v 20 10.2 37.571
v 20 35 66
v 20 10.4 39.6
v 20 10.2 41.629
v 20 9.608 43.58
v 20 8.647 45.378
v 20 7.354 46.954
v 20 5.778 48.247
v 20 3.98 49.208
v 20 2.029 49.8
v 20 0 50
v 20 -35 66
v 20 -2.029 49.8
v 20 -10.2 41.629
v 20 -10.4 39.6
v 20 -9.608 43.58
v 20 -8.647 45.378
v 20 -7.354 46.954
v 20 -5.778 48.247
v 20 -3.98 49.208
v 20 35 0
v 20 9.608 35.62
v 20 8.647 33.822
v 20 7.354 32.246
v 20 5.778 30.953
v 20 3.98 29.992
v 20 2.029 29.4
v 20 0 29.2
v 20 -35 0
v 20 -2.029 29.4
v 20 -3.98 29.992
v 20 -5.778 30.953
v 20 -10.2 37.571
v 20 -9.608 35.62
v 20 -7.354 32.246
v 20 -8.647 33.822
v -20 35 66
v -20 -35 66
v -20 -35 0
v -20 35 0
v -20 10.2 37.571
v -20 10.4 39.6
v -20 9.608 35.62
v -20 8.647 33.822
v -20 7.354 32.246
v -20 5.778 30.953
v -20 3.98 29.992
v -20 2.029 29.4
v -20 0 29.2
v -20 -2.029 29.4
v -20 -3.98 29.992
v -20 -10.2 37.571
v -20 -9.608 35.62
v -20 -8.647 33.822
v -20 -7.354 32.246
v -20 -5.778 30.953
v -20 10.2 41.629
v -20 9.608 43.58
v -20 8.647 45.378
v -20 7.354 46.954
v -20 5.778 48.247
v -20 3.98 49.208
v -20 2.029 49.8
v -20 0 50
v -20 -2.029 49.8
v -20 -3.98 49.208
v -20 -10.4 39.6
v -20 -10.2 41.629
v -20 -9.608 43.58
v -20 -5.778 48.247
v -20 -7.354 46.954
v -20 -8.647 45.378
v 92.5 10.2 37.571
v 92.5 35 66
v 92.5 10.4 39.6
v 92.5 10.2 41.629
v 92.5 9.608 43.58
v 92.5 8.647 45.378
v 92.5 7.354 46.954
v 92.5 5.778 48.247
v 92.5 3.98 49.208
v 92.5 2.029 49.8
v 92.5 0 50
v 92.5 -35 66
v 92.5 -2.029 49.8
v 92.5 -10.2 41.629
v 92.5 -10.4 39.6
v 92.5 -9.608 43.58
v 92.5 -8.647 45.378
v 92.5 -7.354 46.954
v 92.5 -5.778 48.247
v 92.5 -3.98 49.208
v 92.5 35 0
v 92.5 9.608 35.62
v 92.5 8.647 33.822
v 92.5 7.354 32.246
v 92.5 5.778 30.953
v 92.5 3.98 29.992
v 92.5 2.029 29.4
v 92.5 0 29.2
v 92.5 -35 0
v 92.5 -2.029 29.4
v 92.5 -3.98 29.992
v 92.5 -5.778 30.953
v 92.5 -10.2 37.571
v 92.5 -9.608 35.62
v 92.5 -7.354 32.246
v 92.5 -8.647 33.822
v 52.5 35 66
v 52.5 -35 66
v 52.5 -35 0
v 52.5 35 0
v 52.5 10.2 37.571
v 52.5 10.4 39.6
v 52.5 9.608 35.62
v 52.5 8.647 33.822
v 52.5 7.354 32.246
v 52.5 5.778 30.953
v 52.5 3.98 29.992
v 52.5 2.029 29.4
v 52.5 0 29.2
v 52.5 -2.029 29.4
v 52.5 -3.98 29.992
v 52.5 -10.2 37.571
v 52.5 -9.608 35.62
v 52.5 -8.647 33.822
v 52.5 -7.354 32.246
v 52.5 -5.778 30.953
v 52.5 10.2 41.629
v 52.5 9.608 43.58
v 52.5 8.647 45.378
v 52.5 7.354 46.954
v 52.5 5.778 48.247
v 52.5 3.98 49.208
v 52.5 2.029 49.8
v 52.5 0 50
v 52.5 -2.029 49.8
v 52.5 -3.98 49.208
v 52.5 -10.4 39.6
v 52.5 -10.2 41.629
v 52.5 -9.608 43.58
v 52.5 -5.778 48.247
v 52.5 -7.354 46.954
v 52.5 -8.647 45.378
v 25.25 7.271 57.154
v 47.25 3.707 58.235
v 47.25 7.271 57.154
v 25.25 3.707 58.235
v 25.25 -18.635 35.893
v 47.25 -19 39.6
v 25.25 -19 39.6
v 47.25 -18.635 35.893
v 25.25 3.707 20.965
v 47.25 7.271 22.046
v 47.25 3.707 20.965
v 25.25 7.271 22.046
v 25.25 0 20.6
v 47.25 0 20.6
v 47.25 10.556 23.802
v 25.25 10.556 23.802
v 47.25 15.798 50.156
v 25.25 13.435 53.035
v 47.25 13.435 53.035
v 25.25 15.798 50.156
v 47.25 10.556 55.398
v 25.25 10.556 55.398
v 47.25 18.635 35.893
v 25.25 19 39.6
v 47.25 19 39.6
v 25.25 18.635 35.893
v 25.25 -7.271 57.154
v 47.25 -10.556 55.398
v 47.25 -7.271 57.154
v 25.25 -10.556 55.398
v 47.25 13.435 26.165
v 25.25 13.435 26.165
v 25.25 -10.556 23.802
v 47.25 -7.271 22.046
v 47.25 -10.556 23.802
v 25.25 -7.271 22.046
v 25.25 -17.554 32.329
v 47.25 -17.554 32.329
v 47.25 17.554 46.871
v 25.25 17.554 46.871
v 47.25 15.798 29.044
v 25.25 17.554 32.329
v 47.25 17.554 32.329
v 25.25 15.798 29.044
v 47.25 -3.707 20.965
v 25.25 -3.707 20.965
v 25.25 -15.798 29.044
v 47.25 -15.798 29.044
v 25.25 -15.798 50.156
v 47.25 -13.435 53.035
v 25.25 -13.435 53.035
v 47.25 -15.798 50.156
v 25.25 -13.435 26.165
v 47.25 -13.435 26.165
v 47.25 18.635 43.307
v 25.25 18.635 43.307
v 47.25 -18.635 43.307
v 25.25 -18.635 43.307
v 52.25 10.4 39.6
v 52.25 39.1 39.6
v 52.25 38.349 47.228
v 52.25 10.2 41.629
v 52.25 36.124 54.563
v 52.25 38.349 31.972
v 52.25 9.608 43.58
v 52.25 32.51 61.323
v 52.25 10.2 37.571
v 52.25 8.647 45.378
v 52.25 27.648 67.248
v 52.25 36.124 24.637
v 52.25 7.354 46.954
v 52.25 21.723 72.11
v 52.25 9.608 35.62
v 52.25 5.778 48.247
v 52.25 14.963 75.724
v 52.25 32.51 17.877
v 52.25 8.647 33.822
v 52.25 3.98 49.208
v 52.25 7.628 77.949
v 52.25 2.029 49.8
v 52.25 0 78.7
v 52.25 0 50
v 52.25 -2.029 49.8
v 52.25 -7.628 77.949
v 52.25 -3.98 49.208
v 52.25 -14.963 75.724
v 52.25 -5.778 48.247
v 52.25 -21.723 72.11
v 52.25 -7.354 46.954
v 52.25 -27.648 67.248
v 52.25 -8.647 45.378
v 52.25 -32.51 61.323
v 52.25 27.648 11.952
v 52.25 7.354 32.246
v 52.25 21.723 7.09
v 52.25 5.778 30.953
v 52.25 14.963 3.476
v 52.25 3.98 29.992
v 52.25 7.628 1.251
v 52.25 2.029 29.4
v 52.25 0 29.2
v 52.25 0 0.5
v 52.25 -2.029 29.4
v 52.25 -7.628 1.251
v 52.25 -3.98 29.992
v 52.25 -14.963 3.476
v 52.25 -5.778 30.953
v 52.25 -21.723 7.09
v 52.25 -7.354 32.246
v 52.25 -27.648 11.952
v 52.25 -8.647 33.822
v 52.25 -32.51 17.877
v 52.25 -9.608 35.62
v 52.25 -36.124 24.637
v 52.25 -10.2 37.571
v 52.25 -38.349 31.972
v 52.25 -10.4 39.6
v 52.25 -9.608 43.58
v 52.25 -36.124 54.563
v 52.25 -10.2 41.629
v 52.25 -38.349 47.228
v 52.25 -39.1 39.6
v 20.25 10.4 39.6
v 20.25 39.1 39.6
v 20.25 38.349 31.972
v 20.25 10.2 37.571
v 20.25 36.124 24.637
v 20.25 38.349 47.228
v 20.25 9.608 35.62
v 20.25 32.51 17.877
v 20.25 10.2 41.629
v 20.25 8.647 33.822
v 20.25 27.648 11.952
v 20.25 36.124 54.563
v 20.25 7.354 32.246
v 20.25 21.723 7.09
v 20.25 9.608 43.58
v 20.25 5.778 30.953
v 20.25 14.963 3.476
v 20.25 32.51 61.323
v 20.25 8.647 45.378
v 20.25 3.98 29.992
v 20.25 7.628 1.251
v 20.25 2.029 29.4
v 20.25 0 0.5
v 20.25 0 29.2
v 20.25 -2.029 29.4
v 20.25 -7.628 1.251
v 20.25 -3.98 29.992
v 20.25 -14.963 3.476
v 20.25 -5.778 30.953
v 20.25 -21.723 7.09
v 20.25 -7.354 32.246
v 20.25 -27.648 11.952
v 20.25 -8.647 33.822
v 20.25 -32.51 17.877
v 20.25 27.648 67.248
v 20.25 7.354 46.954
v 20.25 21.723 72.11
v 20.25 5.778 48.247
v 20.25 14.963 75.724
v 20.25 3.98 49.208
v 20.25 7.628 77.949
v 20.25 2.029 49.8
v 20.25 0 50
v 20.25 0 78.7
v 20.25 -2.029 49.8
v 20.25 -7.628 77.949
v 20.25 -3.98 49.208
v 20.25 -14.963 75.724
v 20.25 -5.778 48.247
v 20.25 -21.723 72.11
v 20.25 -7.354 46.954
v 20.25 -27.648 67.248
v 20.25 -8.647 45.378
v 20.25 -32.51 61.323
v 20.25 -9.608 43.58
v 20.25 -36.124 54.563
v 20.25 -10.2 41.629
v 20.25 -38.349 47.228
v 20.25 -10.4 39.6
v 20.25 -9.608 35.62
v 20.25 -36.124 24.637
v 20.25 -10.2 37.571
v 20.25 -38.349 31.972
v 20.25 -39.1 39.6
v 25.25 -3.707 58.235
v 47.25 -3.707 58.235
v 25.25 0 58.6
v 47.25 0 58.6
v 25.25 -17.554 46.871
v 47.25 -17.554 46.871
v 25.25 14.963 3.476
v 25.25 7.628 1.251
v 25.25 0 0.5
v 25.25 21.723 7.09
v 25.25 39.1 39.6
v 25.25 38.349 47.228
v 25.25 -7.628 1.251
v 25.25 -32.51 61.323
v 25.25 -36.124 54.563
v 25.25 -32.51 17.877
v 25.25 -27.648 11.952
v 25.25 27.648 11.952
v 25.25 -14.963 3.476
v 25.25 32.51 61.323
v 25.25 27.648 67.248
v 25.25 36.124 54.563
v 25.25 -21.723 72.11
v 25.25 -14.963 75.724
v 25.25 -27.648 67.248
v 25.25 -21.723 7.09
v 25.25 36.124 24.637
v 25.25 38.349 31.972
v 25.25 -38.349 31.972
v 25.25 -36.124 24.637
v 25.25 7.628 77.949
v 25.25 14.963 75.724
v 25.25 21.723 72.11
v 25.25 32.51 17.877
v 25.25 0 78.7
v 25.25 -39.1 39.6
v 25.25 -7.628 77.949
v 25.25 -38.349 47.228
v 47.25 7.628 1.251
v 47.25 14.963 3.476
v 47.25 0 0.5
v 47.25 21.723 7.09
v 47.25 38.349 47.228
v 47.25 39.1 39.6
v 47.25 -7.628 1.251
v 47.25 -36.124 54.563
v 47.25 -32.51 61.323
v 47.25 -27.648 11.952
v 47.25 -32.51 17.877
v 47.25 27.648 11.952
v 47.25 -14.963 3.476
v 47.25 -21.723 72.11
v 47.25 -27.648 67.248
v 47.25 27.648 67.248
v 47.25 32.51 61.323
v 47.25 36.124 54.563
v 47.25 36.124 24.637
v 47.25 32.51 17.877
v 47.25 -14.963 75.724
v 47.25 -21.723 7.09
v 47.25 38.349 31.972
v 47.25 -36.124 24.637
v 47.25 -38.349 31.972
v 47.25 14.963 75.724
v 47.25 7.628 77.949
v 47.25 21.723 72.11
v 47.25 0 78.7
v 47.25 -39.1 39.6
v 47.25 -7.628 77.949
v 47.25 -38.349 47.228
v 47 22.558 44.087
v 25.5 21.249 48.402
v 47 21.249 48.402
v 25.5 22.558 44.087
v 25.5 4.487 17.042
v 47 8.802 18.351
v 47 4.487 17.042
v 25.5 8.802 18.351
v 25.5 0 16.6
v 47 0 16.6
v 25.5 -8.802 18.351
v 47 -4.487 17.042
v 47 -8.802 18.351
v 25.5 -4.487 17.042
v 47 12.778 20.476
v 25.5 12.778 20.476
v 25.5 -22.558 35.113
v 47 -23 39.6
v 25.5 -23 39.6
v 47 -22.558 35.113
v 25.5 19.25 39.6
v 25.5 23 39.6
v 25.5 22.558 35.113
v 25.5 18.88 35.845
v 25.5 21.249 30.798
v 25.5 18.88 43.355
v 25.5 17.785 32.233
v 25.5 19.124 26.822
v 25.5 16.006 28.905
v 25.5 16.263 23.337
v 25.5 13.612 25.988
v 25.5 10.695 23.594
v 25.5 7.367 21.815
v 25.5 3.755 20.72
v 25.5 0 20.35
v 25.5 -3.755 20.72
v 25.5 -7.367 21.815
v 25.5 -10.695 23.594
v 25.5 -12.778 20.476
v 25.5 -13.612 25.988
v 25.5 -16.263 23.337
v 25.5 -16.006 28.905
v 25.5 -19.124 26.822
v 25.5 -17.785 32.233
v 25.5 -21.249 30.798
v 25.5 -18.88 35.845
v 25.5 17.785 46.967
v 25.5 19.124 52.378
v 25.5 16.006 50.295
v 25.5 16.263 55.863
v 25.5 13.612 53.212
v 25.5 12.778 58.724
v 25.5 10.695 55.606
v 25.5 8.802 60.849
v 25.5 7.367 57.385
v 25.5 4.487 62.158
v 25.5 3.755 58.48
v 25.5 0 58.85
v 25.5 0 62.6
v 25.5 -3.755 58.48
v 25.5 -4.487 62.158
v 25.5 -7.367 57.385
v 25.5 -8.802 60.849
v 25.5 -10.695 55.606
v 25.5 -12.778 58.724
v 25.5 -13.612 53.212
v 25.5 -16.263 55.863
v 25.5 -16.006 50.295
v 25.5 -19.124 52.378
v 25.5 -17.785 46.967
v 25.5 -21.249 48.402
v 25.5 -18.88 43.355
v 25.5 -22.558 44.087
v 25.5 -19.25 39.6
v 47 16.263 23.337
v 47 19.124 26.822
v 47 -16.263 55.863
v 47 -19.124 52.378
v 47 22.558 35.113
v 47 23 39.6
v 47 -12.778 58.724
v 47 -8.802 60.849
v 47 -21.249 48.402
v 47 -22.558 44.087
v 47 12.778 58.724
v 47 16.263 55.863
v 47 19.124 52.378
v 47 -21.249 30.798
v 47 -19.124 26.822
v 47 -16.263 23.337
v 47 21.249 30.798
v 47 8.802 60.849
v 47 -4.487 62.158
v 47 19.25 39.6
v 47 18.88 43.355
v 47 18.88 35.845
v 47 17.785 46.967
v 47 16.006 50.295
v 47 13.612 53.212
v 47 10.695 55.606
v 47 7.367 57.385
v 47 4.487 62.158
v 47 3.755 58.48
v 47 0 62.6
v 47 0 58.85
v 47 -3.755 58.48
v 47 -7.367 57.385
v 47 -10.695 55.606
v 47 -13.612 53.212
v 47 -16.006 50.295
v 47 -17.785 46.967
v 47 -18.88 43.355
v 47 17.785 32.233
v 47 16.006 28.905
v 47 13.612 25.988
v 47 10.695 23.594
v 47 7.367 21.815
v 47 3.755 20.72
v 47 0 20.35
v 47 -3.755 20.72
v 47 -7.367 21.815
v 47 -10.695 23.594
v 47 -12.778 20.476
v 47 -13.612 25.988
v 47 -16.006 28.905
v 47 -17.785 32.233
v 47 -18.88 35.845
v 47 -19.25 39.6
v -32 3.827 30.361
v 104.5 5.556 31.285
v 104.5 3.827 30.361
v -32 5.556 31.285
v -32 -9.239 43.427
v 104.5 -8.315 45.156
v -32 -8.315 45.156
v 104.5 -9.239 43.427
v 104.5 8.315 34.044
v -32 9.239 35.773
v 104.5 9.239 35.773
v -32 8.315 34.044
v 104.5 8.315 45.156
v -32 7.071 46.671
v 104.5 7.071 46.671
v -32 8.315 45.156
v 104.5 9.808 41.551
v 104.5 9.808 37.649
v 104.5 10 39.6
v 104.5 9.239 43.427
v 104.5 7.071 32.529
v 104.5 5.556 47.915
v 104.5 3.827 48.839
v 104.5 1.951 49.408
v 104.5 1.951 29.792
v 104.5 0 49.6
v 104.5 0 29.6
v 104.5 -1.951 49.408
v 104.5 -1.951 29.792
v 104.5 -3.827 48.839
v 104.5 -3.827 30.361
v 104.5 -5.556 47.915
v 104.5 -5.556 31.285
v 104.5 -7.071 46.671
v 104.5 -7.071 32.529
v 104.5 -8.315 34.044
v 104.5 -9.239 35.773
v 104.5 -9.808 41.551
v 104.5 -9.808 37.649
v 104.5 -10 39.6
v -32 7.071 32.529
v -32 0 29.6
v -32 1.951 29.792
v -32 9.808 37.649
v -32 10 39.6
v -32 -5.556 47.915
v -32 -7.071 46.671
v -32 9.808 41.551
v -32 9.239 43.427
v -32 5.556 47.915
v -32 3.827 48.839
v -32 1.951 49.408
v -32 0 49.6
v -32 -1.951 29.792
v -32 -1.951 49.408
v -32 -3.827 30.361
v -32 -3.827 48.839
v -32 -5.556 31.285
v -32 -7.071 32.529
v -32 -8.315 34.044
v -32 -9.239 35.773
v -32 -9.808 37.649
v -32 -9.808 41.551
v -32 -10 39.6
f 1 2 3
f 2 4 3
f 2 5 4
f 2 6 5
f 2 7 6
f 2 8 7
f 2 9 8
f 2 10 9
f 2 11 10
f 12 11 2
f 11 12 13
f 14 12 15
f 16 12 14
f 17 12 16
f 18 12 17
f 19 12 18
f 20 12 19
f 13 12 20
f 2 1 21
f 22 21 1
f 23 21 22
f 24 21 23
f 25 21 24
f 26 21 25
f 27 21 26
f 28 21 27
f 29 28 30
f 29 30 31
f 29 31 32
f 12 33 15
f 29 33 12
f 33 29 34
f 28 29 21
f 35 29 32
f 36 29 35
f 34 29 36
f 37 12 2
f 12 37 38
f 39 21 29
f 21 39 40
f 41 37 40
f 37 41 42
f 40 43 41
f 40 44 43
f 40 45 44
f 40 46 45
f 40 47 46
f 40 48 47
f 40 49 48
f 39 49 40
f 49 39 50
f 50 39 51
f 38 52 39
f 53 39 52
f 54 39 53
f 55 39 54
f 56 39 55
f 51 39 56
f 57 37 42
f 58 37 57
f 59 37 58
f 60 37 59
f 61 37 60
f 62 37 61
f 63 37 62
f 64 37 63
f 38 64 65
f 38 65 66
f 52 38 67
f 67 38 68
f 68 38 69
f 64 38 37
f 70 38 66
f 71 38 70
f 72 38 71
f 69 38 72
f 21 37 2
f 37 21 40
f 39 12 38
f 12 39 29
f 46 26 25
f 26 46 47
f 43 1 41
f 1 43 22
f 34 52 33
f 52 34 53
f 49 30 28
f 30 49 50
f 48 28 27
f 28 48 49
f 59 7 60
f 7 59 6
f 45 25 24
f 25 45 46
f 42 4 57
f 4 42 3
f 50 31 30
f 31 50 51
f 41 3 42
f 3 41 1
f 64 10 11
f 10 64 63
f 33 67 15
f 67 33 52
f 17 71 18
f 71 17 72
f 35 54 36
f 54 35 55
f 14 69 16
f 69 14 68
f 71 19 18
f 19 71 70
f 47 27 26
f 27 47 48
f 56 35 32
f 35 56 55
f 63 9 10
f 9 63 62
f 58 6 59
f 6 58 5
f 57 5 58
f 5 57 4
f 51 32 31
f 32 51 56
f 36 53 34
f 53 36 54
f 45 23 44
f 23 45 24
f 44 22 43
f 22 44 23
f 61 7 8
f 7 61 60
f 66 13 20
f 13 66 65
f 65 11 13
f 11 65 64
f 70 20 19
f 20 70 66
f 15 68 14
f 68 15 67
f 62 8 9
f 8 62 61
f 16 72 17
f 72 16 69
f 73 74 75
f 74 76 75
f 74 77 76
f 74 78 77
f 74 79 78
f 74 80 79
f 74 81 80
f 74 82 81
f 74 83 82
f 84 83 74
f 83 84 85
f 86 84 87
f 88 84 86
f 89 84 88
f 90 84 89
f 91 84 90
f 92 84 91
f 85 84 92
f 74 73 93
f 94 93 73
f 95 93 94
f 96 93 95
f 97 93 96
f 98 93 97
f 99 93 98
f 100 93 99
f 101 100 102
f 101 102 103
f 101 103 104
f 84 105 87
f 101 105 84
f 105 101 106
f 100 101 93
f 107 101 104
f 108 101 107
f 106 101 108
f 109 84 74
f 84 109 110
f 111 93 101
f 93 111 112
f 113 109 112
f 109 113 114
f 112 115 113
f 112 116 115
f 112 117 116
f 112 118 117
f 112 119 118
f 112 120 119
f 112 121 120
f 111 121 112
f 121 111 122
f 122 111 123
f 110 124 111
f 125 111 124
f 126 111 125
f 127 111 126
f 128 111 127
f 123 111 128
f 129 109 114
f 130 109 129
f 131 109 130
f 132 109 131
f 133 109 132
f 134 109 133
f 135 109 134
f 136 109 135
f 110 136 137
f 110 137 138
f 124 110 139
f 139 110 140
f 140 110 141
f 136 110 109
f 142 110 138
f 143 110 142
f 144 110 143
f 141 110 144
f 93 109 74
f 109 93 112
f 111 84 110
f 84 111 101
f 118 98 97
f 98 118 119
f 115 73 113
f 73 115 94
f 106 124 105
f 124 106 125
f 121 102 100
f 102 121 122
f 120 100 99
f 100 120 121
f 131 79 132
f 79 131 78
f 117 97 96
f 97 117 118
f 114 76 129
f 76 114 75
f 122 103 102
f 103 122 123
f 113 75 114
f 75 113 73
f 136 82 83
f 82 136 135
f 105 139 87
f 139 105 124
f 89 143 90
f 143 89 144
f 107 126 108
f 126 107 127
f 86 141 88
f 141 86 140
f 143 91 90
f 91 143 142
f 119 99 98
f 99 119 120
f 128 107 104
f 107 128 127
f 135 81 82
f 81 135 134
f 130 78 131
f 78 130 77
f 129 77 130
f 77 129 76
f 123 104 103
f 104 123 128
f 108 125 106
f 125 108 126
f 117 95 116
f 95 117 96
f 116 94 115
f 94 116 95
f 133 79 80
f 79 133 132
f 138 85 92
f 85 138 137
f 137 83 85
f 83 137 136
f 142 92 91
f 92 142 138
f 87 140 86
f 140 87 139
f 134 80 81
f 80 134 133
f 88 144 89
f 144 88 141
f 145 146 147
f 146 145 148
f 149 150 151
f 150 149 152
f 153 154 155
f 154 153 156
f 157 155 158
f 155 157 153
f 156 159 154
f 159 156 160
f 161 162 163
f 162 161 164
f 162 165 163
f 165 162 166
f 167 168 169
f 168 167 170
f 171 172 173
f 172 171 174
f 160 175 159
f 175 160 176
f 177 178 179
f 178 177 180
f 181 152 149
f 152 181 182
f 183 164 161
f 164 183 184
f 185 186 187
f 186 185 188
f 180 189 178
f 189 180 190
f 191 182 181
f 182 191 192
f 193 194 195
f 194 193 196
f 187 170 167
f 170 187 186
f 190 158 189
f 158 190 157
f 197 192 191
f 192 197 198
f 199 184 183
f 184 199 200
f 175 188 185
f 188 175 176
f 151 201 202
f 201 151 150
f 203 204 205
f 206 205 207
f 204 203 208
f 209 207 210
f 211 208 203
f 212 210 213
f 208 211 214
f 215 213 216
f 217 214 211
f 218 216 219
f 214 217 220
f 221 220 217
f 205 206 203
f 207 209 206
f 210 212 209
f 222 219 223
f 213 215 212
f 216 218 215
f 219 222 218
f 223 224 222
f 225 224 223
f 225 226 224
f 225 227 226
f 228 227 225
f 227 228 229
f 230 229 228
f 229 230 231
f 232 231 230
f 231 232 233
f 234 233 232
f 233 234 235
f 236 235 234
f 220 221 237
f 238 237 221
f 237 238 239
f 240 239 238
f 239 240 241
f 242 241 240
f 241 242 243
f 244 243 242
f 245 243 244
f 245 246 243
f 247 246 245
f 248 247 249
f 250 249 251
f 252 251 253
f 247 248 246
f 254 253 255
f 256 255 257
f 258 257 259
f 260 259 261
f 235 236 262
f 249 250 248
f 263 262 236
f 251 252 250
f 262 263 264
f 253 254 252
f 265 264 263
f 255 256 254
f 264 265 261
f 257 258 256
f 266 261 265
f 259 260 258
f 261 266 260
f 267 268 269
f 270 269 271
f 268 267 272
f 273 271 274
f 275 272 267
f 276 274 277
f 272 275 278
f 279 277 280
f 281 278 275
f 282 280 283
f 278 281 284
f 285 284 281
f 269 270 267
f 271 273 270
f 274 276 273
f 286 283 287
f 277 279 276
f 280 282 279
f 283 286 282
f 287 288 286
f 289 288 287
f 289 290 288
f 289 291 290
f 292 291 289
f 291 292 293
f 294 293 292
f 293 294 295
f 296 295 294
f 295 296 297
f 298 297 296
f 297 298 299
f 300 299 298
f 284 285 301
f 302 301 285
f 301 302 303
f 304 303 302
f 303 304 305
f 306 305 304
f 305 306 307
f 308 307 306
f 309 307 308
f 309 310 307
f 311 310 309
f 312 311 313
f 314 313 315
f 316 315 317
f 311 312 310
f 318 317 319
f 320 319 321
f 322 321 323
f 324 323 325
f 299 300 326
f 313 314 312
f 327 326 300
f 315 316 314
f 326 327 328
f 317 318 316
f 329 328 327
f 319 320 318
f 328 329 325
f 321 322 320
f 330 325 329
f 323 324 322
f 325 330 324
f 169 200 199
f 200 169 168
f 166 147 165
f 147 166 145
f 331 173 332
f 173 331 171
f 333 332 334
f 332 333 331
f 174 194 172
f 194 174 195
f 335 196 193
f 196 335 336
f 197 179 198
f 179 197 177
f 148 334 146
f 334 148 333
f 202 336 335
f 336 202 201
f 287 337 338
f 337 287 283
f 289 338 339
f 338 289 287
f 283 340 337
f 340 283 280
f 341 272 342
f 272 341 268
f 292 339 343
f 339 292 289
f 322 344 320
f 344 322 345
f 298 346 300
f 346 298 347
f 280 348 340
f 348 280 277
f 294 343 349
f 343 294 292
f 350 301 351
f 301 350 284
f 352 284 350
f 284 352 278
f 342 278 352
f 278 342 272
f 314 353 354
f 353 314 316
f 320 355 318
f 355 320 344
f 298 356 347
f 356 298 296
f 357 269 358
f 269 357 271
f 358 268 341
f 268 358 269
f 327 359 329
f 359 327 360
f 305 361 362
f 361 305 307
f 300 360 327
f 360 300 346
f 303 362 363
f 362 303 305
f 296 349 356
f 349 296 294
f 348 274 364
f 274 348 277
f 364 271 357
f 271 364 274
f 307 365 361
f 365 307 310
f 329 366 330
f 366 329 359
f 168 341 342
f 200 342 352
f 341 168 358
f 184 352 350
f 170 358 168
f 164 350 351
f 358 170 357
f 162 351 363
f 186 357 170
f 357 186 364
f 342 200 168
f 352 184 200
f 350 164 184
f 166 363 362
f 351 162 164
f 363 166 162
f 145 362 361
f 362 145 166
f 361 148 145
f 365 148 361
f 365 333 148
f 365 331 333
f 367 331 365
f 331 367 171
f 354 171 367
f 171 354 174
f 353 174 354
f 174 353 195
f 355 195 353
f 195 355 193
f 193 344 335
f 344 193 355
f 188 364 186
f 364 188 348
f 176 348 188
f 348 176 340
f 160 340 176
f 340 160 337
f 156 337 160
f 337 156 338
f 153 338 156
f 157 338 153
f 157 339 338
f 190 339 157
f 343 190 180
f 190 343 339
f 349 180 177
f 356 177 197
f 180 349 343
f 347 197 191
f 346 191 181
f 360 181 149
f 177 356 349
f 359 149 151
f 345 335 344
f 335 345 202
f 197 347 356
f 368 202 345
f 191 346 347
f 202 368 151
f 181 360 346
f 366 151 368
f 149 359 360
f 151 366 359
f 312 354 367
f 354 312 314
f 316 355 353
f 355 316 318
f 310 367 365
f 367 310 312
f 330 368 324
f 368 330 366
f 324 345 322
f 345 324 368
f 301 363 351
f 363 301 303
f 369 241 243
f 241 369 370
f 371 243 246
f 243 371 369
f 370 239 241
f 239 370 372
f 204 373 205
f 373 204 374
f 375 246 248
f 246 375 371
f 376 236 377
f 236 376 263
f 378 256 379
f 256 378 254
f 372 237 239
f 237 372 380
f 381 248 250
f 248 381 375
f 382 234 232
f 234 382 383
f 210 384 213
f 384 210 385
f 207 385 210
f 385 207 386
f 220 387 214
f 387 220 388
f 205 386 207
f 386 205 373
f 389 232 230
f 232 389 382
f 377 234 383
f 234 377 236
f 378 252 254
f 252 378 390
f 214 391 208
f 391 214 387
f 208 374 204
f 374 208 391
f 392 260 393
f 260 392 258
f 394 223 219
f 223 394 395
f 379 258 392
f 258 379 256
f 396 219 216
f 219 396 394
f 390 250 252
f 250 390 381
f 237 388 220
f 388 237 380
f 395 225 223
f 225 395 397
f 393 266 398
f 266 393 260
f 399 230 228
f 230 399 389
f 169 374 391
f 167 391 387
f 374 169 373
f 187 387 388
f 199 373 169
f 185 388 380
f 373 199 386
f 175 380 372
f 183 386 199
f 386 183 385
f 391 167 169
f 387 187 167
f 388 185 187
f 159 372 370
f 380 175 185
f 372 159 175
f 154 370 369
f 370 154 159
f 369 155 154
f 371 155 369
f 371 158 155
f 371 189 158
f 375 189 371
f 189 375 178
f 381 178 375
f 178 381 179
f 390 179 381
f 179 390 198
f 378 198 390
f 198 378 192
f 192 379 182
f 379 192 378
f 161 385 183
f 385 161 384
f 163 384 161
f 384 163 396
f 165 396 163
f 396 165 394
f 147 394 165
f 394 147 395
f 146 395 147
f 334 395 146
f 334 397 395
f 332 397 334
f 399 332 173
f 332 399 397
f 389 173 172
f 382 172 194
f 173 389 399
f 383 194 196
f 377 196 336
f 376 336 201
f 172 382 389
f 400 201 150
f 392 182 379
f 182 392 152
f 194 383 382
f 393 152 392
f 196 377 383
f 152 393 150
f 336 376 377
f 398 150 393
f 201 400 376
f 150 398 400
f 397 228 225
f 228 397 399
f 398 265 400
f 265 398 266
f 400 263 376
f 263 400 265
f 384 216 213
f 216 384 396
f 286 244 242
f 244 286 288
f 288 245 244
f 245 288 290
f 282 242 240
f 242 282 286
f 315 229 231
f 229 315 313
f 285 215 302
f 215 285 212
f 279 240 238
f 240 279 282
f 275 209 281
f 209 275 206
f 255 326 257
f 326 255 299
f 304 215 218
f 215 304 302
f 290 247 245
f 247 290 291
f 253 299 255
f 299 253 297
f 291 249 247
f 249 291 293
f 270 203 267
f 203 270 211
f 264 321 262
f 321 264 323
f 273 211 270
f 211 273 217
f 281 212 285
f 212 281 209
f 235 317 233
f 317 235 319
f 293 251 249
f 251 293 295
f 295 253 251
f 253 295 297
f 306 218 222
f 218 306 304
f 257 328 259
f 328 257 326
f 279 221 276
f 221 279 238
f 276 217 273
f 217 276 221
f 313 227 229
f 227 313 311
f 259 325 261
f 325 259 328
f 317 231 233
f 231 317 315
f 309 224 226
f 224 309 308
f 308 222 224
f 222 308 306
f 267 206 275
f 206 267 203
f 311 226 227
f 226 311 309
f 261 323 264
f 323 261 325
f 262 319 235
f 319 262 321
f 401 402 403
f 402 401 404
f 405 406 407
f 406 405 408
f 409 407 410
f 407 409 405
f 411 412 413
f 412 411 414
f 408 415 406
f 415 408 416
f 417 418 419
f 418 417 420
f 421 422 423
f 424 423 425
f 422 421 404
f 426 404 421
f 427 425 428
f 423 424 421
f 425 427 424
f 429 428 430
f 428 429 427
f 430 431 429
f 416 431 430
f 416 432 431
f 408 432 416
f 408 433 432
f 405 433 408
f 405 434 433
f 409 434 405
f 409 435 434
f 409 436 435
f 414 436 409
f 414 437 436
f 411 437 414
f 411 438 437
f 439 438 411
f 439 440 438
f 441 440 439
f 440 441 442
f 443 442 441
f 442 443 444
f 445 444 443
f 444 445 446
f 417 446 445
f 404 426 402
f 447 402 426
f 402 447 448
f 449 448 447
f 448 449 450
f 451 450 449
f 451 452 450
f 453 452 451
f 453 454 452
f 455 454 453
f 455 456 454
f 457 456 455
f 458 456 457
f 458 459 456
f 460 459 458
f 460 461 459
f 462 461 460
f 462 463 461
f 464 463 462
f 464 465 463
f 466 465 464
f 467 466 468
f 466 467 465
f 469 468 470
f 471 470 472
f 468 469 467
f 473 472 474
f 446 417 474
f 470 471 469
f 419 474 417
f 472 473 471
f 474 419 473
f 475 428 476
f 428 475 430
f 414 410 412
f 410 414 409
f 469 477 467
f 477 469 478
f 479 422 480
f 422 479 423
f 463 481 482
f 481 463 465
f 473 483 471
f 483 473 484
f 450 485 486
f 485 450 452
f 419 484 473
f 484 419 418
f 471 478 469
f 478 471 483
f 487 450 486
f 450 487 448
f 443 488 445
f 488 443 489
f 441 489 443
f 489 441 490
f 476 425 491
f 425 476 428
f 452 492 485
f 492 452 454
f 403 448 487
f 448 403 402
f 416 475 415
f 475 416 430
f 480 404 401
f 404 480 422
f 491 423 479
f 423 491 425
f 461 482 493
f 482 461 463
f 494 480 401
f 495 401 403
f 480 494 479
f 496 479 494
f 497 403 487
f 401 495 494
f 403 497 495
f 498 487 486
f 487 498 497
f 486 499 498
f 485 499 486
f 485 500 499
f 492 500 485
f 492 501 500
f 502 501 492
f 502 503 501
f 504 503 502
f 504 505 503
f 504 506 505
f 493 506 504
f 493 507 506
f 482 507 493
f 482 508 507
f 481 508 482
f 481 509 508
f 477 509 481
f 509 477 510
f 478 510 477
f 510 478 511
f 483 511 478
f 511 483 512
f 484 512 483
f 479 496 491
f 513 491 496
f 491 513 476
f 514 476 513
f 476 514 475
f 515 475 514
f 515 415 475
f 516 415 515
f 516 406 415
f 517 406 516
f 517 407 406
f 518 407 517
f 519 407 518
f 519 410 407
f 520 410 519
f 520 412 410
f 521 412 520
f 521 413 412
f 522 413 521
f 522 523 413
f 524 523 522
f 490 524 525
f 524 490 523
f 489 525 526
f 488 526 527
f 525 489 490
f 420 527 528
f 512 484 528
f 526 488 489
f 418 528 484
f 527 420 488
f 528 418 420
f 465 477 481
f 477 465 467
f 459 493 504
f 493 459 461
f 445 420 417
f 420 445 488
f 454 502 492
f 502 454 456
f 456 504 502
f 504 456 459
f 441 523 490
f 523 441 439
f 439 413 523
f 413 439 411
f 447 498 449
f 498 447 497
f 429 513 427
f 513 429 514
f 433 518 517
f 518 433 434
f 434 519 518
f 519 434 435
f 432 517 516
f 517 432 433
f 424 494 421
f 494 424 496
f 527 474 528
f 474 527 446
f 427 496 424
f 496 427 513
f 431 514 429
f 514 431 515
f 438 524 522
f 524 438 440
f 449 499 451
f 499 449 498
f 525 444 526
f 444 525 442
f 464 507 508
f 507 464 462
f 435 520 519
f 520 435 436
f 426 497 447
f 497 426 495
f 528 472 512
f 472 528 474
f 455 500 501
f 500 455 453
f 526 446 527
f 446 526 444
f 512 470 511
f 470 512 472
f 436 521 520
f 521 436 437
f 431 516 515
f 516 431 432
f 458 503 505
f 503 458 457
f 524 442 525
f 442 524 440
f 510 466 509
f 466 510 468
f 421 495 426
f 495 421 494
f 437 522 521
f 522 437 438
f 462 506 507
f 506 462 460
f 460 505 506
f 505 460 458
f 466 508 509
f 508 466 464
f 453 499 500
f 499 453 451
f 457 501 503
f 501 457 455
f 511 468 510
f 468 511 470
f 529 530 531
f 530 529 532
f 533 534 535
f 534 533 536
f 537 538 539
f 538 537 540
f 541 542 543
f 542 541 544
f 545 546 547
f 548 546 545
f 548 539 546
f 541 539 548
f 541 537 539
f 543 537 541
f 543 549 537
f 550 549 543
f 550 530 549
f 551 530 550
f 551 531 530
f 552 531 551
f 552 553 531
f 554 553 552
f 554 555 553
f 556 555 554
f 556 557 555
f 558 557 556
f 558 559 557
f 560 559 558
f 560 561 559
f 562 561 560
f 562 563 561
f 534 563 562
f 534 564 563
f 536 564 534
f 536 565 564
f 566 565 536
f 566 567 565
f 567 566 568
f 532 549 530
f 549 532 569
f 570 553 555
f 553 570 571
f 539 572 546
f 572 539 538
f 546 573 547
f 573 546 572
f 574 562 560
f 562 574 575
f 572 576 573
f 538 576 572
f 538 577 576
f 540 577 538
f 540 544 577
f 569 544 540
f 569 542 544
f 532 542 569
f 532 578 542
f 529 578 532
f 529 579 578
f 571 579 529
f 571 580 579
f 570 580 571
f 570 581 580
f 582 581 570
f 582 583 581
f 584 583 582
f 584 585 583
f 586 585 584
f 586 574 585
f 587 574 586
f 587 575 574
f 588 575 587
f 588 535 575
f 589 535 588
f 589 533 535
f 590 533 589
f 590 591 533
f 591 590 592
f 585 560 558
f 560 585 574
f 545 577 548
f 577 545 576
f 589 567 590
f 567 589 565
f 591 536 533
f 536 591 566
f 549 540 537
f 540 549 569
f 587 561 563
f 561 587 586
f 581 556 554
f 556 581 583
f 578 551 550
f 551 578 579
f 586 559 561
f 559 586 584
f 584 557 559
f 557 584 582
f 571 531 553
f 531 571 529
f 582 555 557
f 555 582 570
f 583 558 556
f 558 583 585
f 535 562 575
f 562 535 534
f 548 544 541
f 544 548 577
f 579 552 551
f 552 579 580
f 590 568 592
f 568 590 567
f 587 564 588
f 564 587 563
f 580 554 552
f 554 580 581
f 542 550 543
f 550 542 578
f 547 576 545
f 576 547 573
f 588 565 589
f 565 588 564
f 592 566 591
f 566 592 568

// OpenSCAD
$fn = 32;

// ------------------------------------------------------------------------
// Pulley assembly: d78.2 pulley with a belt, shaft d20
// Every part is its own module, assembly() places them once.
// ------------------------------------------------------------------------

// --- part 1 ---
module support1() {
  difference() {
    translate([-20, -35, 0]) cube([40, 70, 66]);
    translate([0, 0, 39.6]) rotate([0, 90, 0]) cylinder(h = 42, d = 20.8, center = true);
  }
}

// --- part 2 ---
module support2() {
  difference() {
    translate([-20, -35, 0]) cube([40, 70, 66]);
    translate([0, 0, 39.6]) rotate([0, 90, 0]) cylinder(h = 42, d = 20.8, center = true);
  }
}

// --- part 3 ---
module shaft() {
  translate([0, 0, -68.25]) cylinder(h = 136.5, d = 20);
}

// --- part 4 ---
module pulley() {
  difference() {
    union() {
      cylinder(h = 32, d = 38);
      cylinder(h = 5, d = 78.2);
      translate([0, 0, 27]) cylinder(h = 5, d = 78.2);
    }
    translate([0, 0, -1]) cylinder(h = 34, d = 20.8);
  }
}

// --- part 5 ---
module belt() {
  difference() {
      translate([0, 0, 0]) cylinder(h = 21.5, d = 46);
      translate([0, 0, -1]) cylinder(h = 23.5, d = 38.5);
    }
}

// --- assembly ---
module assembly() {
  translate([0, 0, 0]) rotate([0, 0, 0]) support1();
  translate([72.5, 0, 0]) rotate([0, 0, 0]) support2();
  translate([36.25, 0, 39.6]) rotate([0, 90, 0]) shaft();
  translate([20.25, 0, 39.6]) rotate([0, 90, 0]) pulley();
  translate([25.5, 0, 39.6]) rotate([0, 90, 0]) belt();
}

assembly();
